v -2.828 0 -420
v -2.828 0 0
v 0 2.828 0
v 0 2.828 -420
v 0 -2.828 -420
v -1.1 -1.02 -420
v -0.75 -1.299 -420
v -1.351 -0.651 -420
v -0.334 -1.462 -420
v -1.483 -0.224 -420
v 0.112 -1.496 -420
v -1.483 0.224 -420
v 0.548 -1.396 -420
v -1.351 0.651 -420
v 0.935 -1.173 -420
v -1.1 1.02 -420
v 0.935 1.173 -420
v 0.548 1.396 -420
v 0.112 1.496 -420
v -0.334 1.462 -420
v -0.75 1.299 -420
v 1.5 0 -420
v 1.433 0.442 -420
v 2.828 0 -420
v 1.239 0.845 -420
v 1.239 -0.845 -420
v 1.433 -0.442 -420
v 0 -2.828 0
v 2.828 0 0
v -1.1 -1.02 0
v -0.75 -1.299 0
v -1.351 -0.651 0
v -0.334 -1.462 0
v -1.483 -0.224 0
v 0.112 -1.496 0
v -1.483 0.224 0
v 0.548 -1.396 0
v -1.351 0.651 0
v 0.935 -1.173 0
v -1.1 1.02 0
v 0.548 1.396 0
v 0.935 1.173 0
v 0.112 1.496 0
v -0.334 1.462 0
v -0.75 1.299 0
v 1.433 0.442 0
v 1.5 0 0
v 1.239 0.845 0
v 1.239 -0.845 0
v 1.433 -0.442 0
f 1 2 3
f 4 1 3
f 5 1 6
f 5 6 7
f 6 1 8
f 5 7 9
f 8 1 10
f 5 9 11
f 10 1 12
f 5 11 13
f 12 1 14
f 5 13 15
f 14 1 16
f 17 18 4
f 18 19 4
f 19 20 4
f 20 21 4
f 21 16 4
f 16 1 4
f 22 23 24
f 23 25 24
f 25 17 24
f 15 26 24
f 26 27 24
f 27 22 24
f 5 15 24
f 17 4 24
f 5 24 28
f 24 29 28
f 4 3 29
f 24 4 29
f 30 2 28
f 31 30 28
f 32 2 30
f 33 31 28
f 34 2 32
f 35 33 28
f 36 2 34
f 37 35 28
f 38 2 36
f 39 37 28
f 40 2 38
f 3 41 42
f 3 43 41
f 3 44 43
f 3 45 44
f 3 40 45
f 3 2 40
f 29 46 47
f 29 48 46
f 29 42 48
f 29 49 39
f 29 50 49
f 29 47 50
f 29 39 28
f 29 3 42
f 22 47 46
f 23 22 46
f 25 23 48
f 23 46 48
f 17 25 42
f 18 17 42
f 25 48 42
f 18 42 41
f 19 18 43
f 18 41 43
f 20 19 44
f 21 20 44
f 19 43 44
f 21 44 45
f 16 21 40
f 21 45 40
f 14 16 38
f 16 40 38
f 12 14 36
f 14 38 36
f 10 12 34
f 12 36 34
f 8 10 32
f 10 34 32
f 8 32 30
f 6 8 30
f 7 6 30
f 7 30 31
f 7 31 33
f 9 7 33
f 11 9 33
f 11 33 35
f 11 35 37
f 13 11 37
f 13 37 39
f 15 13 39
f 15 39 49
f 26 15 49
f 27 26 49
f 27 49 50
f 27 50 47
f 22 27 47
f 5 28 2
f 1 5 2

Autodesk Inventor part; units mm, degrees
ref_plane "YZ Plane" through (0, 0, 0) normal (1, 0, 0) x (0, 1, 0)
ref_plane "XZ Plane" through (0, 0, 0) normal (0, 1, 0) x (-1, 0, 0)
ref_plane "XY Plane" through (0, 0, 0) normal (0, 0, 1) x (1, 0, 0)
sketch "スケッチ1" plane through (0, 0, 0) normal (0, 0, 1) x (1, 0, 0)
  circle A0 centre (0, 0) radius 1.5
  line L0 (-2.8284, 0) -> (0, 2.8284)
  line L1 (0, 2.8284) -> (2.8284, 0)
  line L2 (2.8284, 0) -> (0, -2.8284)
  line L3 (0, -2.8284) -> (-2.8284, 0)
  dimension "d0" = 3
  dimension "d1" = 4
extrude "押し出し1" add sketch "スケッチ1" against normal blind 420
properties part number "MainRod" material "CFRP"
